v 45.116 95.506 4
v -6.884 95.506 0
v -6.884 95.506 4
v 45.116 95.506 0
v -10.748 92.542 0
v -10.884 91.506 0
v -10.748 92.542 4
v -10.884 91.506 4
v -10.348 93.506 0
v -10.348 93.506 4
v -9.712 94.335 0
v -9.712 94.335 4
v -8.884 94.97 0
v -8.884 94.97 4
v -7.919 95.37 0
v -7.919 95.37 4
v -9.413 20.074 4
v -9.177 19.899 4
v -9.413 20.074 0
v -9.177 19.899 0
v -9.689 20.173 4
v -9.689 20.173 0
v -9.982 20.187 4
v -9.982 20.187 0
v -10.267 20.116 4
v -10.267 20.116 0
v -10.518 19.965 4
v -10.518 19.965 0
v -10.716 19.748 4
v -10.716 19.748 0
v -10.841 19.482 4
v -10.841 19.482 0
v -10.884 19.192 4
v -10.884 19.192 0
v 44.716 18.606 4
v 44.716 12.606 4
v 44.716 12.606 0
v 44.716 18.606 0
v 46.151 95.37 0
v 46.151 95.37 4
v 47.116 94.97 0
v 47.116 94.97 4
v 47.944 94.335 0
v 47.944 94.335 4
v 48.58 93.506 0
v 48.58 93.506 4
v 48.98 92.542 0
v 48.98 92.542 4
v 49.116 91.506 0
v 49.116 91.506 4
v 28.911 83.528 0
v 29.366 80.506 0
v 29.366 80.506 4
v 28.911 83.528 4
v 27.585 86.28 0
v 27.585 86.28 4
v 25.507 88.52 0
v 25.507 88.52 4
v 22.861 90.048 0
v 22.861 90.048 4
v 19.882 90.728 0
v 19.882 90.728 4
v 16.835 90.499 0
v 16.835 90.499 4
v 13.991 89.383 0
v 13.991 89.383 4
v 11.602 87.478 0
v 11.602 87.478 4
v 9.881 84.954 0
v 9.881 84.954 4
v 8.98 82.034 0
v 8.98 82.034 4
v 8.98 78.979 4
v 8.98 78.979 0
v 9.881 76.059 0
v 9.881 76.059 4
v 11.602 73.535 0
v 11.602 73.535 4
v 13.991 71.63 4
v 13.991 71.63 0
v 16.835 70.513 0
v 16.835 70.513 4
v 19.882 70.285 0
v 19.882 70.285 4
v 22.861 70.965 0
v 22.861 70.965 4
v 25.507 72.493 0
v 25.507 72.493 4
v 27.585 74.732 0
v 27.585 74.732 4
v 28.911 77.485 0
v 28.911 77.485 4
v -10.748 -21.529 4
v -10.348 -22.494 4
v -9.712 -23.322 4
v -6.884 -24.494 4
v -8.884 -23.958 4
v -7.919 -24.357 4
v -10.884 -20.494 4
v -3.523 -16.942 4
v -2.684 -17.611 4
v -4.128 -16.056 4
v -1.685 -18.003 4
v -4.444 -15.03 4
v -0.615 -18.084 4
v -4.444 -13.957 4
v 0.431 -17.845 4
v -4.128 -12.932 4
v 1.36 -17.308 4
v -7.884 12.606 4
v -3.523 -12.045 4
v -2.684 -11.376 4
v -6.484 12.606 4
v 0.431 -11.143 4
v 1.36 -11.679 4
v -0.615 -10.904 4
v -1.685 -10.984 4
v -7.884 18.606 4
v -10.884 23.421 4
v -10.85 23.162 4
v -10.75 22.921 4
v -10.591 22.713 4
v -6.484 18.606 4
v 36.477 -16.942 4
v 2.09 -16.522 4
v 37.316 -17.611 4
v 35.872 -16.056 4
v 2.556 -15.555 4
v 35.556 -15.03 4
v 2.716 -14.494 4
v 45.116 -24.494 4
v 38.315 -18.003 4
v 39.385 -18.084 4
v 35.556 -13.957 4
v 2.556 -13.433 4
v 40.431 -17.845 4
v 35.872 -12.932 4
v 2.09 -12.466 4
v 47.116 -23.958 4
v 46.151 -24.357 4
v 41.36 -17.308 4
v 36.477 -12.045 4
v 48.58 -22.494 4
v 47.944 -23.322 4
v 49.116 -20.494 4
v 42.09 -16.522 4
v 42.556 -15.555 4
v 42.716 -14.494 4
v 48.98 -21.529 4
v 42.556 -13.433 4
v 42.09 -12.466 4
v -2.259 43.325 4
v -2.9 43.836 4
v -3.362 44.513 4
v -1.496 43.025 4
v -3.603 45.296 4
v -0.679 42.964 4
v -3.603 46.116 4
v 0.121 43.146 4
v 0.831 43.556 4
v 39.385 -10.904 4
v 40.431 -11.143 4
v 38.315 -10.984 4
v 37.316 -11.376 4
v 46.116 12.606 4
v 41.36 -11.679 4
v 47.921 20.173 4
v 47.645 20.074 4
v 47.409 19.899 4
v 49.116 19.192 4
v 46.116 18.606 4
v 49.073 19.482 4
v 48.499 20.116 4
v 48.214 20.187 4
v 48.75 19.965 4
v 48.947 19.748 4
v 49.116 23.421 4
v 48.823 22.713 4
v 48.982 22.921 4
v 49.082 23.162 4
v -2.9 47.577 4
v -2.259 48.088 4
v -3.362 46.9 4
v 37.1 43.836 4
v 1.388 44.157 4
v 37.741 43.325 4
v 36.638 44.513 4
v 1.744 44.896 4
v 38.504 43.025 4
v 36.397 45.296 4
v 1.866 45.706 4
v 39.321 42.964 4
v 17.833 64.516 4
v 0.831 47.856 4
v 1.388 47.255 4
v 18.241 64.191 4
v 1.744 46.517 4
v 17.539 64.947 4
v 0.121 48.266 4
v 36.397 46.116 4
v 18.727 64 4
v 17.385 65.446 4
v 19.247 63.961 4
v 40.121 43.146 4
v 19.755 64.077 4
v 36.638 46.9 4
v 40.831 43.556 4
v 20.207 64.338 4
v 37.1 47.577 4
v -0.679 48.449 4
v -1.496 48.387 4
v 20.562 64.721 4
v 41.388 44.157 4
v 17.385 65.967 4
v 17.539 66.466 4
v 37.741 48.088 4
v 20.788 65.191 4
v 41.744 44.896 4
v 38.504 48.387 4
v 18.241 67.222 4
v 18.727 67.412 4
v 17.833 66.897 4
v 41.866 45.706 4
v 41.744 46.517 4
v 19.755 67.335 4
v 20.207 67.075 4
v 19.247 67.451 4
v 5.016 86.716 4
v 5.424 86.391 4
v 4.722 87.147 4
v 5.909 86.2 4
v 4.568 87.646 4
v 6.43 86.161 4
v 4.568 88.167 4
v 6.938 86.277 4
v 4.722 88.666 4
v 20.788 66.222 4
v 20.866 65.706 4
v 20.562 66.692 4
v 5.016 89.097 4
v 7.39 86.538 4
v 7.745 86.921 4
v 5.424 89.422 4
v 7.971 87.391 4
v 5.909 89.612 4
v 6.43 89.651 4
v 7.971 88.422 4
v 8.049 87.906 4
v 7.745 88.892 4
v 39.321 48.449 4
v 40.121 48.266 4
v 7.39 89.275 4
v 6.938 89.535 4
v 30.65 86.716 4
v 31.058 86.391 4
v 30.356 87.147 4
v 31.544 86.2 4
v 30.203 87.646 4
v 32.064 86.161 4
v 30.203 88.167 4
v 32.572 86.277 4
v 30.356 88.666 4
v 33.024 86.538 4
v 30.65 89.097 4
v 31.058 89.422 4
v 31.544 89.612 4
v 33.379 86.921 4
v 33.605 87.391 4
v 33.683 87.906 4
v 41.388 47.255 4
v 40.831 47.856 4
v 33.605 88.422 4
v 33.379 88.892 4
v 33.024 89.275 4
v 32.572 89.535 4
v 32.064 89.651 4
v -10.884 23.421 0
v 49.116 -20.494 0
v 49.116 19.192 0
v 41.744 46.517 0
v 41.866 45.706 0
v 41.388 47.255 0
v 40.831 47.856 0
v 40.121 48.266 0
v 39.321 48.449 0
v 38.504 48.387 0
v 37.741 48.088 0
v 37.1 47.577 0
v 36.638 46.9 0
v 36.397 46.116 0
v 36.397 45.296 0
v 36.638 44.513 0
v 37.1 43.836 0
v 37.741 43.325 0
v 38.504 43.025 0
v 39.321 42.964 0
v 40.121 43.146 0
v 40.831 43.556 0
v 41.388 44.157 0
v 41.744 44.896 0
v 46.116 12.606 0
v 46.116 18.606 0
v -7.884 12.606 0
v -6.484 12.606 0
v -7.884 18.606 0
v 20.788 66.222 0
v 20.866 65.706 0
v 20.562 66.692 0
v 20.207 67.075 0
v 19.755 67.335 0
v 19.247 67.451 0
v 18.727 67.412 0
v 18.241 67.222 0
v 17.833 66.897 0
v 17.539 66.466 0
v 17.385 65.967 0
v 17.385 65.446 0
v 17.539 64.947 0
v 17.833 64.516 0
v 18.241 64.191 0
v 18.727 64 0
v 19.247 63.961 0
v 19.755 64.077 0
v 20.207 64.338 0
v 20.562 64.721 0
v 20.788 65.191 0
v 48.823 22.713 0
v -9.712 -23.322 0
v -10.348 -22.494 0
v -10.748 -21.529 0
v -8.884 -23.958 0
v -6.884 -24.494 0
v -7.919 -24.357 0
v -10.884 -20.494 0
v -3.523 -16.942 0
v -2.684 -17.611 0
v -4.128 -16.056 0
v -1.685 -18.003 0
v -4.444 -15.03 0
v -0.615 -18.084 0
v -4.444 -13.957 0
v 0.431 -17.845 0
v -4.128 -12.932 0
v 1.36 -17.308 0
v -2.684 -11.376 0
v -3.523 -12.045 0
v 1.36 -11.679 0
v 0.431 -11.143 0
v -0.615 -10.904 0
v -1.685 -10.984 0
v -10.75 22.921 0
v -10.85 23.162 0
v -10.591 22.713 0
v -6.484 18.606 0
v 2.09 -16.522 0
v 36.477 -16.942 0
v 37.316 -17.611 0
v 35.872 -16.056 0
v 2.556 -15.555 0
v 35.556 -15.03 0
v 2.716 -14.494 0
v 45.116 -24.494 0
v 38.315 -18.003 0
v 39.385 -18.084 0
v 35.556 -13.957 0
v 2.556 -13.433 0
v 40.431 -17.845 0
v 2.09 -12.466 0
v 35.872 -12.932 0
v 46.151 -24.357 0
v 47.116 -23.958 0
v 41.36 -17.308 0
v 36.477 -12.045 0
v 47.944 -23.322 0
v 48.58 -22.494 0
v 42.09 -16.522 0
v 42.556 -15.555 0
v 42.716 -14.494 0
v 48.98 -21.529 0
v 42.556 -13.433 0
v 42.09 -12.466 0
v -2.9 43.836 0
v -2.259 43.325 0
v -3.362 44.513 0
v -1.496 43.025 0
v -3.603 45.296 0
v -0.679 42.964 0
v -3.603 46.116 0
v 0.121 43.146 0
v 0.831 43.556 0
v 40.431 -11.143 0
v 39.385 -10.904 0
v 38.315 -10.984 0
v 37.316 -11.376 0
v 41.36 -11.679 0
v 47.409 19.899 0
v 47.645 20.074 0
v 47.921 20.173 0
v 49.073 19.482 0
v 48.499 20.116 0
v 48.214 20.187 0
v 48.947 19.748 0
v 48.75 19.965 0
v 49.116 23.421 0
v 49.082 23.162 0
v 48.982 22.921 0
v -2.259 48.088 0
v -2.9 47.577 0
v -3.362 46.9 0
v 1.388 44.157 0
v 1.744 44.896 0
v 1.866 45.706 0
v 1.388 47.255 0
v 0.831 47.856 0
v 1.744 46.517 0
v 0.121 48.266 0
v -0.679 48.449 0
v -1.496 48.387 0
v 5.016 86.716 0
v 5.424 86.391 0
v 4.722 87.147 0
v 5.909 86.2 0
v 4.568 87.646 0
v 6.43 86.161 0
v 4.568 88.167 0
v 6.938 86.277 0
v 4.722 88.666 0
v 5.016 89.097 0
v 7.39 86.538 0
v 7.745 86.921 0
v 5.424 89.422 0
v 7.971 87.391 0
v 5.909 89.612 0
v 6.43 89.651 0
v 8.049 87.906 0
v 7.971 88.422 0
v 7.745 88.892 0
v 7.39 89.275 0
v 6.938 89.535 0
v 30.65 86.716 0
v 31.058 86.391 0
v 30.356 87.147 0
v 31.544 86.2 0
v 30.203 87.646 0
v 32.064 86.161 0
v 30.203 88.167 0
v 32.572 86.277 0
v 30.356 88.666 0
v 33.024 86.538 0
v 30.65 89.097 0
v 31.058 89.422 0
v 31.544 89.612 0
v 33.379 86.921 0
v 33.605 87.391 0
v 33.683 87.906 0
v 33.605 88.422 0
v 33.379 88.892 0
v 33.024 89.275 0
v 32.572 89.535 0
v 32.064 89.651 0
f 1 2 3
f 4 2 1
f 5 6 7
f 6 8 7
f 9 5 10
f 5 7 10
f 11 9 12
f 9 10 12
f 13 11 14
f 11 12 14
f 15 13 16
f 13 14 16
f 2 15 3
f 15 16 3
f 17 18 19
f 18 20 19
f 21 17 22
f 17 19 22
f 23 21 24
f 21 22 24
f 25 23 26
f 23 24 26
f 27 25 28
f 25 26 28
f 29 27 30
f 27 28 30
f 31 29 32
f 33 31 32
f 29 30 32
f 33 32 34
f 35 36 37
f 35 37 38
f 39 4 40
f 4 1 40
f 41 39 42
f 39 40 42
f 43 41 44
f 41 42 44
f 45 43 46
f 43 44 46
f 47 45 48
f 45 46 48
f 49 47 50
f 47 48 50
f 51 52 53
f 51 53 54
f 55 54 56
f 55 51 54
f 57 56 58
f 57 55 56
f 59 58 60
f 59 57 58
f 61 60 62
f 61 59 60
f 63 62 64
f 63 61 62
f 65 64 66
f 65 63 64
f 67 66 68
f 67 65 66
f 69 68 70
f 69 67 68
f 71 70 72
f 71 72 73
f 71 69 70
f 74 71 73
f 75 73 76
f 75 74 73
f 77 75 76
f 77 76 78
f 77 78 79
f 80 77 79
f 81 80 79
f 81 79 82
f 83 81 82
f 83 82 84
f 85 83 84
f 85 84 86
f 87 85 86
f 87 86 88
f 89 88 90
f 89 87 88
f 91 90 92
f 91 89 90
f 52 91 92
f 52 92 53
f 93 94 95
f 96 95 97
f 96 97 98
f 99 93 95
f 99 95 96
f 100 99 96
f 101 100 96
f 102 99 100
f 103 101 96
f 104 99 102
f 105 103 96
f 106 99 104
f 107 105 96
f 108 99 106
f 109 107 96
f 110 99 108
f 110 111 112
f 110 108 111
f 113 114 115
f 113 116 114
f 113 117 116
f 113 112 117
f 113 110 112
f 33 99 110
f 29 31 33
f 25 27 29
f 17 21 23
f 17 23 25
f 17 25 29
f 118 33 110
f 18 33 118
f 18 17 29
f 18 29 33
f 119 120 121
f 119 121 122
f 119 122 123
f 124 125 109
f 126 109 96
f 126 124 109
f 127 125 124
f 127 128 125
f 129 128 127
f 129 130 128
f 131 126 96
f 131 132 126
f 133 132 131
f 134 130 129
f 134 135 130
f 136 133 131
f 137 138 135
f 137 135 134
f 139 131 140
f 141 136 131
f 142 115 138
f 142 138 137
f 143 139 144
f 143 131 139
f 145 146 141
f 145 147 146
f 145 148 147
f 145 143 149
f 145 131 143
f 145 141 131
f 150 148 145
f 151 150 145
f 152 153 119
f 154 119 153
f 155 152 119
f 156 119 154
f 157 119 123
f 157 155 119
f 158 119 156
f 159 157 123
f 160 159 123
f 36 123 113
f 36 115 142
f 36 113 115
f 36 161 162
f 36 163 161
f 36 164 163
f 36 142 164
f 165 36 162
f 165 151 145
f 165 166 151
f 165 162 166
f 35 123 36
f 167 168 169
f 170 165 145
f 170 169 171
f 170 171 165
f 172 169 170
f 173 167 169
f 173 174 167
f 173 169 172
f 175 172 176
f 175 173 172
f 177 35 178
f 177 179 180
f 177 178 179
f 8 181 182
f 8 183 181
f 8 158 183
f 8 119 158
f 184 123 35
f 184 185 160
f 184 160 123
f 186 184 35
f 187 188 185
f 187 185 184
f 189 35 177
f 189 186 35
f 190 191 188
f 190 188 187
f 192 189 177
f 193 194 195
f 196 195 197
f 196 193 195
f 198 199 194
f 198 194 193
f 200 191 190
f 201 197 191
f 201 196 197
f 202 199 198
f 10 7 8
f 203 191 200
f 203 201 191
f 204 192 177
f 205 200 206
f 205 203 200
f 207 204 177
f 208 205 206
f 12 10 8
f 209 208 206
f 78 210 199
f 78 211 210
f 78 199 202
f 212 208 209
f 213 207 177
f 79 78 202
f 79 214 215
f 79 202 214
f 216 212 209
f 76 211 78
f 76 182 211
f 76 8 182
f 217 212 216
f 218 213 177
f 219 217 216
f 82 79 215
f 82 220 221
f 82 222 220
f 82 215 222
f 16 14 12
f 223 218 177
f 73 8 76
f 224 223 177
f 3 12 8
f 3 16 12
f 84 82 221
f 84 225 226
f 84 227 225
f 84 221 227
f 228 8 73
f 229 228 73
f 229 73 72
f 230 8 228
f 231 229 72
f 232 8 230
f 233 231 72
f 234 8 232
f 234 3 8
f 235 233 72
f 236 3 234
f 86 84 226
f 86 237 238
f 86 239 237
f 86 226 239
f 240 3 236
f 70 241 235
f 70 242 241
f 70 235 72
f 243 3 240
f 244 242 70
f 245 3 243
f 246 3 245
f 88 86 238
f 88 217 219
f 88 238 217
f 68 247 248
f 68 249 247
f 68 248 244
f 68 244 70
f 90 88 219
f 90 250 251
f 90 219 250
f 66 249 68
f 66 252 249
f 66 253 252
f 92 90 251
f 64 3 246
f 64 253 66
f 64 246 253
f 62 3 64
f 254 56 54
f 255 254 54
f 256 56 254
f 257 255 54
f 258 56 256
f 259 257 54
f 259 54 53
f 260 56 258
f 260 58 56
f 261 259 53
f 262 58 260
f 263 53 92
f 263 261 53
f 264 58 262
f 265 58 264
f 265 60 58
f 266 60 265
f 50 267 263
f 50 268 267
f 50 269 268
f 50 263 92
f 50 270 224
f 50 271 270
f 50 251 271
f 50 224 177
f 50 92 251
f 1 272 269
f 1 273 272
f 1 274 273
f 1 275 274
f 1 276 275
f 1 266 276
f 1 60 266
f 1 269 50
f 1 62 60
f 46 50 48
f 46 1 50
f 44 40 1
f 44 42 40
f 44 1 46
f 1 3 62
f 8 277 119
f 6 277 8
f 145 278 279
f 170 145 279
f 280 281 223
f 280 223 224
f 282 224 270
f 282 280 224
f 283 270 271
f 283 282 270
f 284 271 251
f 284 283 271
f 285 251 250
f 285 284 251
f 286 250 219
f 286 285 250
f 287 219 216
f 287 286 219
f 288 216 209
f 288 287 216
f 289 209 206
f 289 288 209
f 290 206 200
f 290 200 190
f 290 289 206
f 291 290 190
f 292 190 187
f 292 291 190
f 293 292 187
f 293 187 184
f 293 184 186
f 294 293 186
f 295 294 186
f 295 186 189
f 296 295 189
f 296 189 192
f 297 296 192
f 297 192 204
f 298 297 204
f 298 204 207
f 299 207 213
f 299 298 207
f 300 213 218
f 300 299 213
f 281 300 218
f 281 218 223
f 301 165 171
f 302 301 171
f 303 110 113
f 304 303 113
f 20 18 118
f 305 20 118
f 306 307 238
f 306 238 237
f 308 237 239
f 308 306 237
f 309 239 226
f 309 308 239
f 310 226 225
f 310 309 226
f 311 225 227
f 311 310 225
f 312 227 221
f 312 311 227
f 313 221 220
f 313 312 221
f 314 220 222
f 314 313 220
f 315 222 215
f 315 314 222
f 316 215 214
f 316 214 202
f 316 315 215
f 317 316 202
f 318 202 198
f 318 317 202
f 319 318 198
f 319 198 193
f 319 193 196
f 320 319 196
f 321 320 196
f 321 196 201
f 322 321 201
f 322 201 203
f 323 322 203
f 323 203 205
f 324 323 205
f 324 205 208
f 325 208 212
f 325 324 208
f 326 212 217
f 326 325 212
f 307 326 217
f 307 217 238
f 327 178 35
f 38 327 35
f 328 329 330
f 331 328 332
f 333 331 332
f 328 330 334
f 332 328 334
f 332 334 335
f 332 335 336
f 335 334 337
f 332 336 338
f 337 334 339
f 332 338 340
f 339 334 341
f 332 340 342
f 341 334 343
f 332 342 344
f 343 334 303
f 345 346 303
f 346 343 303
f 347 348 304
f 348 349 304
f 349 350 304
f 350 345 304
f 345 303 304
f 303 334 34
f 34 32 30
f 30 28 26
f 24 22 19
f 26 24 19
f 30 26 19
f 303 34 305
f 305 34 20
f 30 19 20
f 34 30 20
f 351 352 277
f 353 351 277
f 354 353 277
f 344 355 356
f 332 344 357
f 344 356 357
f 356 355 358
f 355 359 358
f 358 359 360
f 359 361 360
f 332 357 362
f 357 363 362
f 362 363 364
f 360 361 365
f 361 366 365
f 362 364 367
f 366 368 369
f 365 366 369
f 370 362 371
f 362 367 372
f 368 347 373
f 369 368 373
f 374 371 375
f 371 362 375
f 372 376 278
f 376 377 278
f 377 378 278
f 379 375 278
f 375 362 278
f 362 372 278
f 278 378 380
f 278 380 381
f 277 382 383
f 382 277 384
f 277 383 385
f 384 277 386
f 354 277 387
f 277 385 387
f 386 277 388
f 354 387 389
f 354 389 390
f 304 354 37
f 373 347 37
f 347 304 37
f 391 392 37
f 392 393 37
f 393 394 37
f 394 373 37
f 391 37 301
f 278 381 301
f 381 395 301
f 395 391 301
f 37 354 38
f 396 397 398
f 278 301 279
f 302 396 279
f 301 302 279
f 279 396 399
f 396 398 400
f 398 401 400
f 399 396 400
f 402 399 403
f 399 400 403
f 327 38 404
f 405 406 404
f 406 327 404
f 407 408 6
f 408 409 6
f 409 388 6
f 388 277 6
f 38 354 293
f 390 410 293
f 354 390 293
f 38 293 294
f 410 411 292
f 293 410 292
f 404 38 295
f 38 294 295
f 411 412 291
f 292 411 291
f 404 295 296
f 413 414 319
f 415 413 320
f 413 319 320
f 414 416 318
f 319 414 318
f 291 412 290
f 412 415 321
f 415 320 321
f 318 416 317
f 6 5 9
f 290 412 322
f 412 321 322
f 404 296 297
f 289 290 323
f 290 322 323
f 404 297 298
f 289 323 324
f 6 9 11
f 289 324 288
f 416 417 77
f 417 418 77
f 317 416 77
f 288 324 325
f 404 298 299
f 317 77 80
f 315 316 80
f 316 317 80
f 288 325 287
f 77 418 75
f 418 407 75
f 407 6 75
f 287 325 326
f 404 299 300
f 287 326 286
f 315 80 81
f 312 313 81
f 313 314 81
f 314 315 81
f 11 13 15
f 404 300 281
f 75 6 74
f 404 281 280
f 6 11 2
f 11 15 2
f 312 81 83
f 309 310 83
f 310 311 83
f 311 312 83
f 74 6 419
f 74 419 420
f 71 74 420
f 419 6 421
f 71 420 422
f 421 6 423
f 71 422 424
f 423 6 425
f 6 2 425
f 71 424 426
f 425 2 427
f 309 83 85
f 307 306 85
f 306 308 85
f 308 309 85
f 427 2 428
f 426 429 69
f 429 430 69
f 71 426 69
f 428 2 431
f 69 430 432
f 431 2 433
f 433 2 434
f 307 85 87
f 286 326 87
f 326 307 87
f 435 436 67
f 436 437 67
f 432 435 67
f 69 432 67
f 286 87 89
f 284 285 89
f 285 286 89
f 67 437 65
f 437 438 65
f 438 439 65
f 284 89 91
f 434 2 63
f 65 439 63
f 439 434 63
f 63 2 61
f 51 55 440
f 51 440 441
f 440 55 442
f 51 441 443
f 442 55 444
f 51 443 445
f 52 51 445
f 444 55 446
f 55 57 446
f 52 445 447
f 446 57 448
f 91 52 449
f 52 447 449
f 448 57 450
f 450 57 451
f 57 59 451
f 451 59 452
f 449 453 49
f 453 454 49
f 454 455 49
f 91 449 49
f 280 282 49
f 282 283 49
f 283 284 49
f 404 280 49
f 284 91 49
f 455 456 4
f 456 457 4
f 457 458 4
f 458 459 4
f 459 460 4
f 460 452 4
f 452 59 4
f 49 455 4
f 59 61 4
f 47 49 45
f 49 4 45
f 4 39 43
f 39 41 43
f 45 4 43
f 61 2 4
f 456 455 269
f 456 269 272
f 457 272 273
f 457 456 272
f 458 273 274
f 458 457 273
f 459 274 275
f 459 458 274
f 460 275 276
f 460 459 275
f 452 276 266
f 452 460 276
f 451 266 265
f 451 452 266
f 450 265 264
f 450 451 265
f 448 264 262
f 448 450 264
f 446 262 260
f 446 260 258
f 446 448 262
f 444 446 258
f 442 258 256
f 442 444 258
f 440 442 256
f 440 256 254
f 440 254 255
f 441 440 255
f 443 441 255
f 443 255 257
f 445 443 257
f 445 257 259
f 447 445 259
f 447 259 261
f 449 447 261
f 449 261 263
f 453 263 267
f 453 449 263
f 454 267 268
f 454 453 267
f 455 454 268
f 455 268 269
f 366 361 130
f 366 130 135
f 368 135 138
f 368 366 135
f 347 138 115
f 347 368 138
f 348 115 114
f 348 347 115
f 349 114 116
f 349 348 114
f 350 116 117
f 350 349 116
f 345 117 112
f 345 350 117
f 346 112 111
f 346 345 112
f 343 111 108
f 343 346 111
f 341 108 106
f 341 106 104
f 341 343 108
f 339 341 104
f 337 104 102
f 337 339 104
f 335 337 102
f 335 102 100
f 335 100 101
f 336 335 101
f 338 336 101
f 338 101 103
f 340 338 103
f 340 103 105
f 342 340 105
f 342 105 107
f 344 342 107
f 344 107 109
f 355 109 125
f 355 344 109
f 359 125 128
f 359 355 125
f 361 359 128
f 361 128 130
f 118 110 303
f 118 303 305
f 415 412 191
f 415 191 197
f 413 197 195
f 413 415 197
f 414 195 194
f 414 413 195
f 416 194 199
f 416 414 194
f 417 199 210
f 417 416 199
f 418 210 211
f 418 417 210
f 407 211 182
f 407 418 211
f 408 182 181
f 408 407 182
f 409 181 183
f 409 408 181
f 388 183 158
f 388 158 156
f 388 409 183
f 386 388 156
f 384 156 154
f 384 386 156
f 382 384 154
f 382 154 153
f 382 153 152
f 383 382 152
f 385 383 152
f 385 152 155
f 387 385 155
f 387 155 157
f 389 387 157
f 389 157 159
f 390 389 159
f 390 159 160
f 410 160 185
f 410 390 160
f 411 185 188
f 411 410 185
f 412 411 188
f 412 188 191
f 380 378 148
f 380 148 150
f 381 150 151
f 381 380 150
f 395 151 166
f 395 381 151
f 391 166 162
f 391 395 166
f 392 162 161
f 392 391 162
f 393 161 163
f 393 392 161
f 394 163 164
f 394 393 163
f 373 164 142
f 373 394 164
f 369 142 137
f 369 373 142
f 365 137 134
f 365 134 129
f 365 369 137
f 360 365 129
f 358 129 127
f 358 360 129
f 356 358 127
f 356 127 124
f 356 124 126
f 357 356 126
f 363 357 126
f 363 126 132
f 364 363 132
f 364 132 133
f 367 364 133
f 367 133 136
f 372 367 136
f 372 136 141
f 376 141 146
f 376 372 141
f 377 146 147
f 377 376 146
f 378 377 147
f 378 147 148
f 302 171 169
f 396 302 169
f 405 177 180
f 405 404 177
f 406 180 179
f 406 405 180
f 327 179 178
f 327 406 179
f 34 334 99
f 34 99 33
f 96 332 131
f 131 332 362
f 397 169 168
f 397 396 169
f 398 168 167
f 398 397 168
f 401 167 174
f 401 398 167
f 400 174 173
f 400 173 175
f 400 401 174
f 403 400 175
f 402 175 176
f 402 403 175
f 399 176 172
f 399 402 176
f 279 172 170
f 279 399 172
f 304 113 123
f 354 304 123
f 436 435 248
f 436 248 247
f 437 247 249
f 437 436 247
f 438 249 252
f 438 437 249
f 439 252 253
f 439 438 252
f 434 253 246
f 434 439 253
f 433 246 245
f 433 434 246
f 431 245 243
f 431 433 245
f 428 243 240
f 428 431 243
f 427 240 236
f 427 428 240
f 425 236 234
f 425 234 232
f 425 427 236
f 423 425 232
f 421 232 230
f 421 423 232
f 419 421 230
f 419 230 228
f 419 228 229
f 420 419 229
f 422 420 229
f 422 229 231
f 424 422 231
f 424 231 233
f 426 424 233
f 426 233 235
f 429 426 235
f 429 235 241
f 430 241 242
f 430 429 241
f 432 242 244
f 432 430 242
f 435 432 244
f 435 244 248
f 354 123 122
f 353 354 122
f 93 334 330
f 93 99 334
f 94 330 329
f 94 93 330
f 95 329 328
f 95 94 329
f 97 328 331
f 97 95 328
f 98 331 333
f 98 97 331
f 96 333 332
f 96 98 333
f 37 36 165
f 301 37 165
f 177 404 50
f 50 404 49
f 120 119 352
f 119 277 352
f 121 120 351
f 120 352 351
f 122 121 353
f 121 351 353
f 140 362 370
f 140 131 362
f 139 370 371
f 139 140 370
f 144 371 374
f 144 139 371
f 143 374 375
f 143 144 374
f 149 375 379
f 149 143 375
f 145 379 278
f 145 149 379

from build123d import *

# Parameters (mm, degrees)
SZKIC1_W                    = 60
SZKIC1_H                    = 120
SZKIC1_R                    = 2.75
SZKIC1_R_2                  = 3.6
SZKIC1_R_3                  = 10.25
SZKIC1_R_4                  = 1.75
DODANIE_WYCI_GNI_CIE1_DEPTH = 4
ZAOKR_GLENIE1_R             = 4
SZKIC2_W                    = 1.4
SZKIC2_H                    = 6
WYTNIJ_WYCI_GNI_CIE1_DEPTH  = 10
ZAOKR_GLENIE2_R             = 1
ZAOKR_GLENIE3_R             = 1


with BuildPart() as part:
    # Szkic1 → Dodanie-wyciągnięcie1 (new body)
    with BuildSketch(Plane.XY):
        with Locations((19.115931961, 35.506335127)):
            Rectangle(SZKIC1_W, SZKIC1_H)
        with Locations((-0.884068039, 45.706335127)):
            Circle(SZKIC1_R, mode=Mode.SUBTRACT)
        with Locations((-0.884068039, -14.493664873)):
            Circle(SZKIC1_R_2, mode=Mode.SUBTRACT)
        with Locations((39.115931961, -14.493664873)):
            Circle(SZKIC1_R_2, mode=Mode.SUBTRACT)
        with Locations((39.115931961, 45.706335127)):
            Circle(SZKIC1_R, mode=Mode.SUBTRACT)
        with Locations((19.115931961, 80.506335127)):
            Circle(SZKIC1_R_3, mode=Mode.SUBTRACT)
        with Locations((6.298755985, 87.906335127)):
            Circle(SZKIC1_R_4, mode=Mode.SUBTRACT)
        with Locations((31.933107937, 87.906335127)):
            Circle(SZKIC1_R_4, mode=Mode.SUBTRACT)
        with Locations((19.115931961, 65.706335127)):
            Circle(SZKIC1_R_4, mode=Mode.SUBTRACT)
    extrude(amount=DODANIE_WYCI_GNI_CIE1_DEPTH)

    # Zaokrąglenie1
    zaokr_glenie1_edges = [part.edges().sort_by_distance(p)[0] for p in [
        (-10.884068039, 95.506335127, 2),
        (49.115931961, 95.506335127, 2),
        (49.115931961, -24.493664873, 2),
        (-10.884068039, -24.493664873, 2),
    ]]
    fillet(zaokr_glenie1_edges, radius=ZAOKR_GLENIE1_R)

    # Szkic2 → Wytnij-wyciągnięcie1 (cut)
    with BuildSketch(Plane.XY.offset(4)):
        with Locations((-7.184068039, 15.606335127)):
            Rectangle(SZKIC2_W, SZKIC2_H)
        Polygon((-10.884068039, 21.606335127), (-7.884068039, 18.606335127), (-6.484068039, 18.606335127), (-10.884068039, 23.006335127), align=None)
        Polygon((49.115931961, 23.006335127), (44.715931961, 18.606335127), (46.115931961, 18.606335127), (49.115931961, 21.606335127), align=None)
        with Locations((45.415931961, 15.606335127)):
            Rectangle(SZKIC2_W, SZKIC2_H)
    extrude(amount=-WYTNIJ_WYCI_GNI_CIE1_DEPTH, mode=Mode.SUBTRACT)

    # Zaokrąglenie2
    zaokr_glenie2_edges = [part.edges().sort_by_distance(p)[0] for p in [
        (49.115931961, 21.606335127, 2),
        (49.115931961, 23.006335127, 2),
    ]]
    fillet(zaokr_glenie2_edges, radius=ZAOKR_GLENIE2_R)

    # Zaokrąglenie3
    zaokr_glenie3_edges = [part.edges().sort_by_distance(p)[0] for p in [
        (-10.884068039, 23.006335127, 2),
        (-10.884068039, 21.606335127, 2),
    ]]
    fillet(zaokr_glenie3_edges, radius=ZAOKR_GLENIE3_R)


solid = part.part
